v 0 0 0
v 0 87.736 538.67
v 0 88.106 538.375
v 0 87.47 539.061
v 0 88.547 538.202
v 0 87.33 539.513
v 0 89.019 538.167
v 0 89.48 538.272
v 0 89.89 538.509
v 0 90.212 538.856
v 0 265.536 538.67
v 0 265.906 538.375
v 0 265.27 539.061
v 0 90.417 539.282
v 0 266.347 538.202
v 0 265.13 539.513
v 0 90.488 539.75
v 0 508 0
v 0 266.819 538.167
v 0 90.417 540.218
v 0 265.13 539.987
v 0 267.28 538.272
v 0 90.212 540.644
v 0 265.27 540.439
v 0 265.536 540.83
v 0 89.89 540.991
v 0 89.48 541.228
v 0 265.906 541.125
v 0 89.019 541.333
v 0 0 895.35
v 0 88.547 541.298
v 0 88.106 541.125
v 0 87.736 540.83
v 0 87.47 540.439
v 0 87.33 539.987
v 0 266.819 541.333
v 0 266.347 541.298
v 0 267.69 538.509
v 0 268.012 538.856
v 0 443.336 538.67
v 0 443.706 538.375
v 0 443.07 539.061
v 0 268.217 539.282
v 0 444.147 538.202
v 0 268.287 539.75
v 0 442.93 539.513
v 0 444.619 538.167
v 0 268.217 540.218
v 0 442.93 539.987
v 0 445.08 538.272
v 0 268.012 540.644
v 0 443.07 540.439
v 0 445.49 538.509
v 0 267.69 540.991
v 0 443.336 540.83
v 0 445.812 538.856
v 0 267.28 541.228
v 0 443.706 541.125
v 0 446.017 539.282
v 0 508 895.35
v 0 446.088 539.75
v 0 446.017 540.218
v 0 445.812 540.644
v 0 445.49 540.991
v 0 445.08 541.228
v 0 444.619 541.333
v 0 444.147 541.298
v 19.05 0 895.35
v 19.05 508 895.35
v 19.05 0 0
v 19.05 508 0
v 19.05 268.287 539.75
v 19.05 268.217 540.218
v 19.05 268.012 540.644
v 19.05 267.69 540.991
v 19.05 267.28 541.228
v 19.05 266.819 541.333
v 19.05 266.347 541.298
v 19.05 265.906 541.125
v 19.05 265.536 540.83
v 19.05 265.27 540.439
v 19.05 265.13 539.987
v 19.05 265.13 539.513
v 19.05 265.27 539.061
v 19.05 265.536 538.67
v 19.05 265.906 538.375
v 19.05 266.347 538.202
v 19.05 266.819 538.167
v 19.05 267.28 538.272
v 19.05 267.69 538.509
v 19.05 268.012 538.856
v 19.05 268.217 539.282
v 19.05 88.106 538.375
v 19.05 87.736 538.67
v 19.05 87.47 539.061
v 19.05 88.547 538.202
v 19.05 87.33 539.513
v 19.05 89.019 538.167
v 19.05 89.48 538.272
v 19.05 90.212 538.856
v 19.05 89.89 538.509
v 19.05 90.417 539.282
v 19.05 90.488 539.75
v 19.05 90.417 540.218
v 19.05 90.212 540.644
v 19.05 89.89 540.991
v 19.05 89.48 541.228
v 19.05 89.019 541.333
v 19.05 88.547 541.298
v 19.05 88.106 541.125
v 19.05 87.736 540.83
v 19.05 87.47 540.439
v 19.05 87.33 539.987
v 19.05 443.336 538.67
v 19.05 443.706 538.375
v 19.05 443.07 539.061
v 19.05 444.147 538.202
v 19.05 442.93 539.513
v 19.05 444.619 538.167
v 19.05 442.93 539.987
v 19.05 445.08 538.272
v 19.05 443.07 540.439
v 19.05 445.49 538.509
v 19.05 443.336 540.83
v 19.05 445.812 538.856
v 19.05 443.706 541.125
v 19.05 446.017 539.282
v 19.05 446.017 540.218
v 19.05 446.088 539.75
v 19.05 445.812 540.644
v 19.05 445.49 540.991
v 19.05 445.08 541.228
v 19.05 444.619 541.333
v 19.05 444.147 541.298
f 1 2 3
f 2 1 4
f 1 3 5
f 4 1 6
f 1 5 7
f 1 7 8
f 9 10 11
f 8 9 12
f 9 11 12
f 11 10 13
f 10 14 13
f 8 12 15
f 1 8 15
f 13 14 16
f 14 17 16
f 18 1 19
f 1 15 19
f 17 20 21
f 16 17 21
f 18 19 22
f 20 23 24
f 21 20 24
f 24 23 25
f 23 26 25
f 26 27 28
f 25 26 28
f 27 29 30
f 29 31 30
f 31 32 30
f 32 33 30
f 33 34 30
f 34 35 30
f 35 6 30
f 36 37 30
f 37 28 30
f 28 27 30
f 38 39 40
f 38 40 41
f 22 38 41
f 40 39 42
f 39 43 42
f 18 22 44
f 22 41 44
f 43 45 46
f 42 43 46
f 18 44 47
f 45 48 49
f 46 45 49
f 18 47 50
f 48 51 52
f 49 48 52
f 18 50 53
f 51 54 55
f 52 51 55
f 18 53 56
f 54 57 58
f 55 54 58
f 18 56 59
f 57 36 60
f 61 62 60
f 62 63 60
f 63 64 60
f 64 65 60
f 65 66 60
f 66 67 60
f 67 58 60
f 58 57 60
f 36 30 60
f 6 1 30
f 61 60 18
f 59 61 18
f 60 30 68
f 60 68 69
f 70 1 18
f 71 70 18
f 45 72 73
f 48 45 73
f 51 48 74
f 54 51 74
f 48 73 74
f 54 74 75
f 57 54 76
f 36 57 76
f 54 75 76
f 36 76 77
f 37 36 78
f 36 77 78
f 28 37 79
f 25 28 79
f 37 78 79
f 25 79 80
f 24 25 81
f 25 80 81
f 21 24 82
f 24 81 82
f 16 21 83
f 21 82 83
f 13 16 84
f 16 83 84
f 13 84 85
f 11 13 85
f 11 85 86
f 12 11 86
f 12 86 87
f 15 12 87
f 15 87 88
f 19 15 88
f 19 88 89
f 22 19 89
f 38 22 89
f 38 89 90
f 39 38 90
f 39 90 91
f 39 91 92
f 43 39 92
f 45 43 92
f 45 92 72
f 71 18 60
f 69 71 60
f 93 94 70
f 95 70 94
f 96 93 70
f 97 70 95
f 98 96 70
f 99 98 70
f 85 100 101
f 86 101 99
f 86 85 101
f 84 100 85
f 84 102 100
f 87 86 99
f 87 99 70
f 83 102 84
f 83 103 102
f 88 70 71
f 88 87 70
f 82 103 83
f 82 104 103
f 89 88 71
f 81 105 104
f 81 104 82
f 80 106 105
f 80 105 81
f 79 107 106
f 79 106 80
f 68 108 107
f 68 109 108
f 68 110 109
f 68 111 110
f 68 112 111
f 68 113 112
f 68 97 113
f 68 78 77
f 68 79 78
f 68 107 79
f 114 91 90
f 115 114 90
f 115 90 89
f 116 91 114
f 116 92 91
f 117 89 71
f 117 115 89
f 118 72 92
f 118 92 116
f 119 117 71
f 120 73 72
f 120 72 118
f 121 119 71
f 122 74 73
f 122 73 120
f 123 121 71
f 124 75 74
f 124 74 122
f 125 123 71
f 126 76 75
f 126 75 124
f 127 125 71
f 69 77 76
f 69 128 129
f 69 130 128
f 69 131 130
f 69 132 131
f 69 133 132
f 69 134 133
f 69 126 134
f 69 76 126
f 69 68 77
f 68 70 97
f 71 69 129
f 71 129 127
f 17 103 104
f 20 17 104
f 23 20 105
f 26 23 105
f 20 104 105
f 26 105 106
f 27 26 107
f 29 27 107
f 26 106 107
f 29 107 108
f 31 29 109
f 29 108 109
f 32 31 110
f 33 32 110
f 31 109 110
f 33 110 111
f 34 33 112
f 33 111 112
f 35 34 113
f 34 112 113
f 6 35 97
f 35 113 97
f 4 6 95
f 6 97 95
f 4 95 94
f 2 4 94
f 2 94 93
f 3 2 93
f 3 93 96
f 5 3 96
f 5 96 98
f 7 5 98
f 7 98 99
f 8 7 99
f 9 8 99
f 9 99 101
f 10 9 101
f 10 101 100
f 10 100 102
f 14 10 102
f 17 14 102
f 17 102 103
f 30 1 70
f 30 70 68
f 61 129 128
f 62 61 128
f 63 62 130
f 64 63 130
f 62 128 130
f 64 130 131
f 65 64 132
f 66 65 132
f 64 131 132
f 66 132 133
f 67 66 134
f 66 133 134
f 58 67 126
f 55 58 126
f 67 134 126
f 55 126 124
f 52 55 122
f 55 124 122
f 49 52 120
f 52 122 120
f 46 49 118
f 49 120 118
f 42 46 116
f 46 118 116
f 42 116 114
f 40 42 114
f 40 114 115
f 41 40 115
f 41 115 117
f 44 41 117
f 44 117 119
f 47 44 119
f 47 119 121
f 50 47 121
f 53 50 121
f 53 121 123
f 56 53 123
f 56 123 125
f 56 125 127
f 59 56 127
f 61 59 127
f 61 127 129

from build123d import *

# Parameters (mm, degrees)
F0_W     = 508
F0_H     = 895.35
F1_DEPTH = 19.05
F2_R     = 1.5875
F3_DEPTH = 25.4


with BuildPart() as f1:
    # F0 (on Right) → F1 (new body)
    with BuildSketch(Plane.YZ):
        with Locations((254, 447.675)):
            Rectangle(F0_W, F0_H)
    extrude(amount=F1_DEPTH)

    # F2 (on face) → F3 (cut)
    with BuildSketch(Plane.YZ.offset(19.05)):
        with Locations((88.9, 539.75)):
            Circle(F2_R)
        with Locations((266.7, 539.75)):
            Circle(F2_R)
        with Locations((444.5, 539.75)):
            Circle(F2_R)
    extrude(amount=-F3_DEPTH, mode=Mode.SUBTRACT)


solid = f1.part
